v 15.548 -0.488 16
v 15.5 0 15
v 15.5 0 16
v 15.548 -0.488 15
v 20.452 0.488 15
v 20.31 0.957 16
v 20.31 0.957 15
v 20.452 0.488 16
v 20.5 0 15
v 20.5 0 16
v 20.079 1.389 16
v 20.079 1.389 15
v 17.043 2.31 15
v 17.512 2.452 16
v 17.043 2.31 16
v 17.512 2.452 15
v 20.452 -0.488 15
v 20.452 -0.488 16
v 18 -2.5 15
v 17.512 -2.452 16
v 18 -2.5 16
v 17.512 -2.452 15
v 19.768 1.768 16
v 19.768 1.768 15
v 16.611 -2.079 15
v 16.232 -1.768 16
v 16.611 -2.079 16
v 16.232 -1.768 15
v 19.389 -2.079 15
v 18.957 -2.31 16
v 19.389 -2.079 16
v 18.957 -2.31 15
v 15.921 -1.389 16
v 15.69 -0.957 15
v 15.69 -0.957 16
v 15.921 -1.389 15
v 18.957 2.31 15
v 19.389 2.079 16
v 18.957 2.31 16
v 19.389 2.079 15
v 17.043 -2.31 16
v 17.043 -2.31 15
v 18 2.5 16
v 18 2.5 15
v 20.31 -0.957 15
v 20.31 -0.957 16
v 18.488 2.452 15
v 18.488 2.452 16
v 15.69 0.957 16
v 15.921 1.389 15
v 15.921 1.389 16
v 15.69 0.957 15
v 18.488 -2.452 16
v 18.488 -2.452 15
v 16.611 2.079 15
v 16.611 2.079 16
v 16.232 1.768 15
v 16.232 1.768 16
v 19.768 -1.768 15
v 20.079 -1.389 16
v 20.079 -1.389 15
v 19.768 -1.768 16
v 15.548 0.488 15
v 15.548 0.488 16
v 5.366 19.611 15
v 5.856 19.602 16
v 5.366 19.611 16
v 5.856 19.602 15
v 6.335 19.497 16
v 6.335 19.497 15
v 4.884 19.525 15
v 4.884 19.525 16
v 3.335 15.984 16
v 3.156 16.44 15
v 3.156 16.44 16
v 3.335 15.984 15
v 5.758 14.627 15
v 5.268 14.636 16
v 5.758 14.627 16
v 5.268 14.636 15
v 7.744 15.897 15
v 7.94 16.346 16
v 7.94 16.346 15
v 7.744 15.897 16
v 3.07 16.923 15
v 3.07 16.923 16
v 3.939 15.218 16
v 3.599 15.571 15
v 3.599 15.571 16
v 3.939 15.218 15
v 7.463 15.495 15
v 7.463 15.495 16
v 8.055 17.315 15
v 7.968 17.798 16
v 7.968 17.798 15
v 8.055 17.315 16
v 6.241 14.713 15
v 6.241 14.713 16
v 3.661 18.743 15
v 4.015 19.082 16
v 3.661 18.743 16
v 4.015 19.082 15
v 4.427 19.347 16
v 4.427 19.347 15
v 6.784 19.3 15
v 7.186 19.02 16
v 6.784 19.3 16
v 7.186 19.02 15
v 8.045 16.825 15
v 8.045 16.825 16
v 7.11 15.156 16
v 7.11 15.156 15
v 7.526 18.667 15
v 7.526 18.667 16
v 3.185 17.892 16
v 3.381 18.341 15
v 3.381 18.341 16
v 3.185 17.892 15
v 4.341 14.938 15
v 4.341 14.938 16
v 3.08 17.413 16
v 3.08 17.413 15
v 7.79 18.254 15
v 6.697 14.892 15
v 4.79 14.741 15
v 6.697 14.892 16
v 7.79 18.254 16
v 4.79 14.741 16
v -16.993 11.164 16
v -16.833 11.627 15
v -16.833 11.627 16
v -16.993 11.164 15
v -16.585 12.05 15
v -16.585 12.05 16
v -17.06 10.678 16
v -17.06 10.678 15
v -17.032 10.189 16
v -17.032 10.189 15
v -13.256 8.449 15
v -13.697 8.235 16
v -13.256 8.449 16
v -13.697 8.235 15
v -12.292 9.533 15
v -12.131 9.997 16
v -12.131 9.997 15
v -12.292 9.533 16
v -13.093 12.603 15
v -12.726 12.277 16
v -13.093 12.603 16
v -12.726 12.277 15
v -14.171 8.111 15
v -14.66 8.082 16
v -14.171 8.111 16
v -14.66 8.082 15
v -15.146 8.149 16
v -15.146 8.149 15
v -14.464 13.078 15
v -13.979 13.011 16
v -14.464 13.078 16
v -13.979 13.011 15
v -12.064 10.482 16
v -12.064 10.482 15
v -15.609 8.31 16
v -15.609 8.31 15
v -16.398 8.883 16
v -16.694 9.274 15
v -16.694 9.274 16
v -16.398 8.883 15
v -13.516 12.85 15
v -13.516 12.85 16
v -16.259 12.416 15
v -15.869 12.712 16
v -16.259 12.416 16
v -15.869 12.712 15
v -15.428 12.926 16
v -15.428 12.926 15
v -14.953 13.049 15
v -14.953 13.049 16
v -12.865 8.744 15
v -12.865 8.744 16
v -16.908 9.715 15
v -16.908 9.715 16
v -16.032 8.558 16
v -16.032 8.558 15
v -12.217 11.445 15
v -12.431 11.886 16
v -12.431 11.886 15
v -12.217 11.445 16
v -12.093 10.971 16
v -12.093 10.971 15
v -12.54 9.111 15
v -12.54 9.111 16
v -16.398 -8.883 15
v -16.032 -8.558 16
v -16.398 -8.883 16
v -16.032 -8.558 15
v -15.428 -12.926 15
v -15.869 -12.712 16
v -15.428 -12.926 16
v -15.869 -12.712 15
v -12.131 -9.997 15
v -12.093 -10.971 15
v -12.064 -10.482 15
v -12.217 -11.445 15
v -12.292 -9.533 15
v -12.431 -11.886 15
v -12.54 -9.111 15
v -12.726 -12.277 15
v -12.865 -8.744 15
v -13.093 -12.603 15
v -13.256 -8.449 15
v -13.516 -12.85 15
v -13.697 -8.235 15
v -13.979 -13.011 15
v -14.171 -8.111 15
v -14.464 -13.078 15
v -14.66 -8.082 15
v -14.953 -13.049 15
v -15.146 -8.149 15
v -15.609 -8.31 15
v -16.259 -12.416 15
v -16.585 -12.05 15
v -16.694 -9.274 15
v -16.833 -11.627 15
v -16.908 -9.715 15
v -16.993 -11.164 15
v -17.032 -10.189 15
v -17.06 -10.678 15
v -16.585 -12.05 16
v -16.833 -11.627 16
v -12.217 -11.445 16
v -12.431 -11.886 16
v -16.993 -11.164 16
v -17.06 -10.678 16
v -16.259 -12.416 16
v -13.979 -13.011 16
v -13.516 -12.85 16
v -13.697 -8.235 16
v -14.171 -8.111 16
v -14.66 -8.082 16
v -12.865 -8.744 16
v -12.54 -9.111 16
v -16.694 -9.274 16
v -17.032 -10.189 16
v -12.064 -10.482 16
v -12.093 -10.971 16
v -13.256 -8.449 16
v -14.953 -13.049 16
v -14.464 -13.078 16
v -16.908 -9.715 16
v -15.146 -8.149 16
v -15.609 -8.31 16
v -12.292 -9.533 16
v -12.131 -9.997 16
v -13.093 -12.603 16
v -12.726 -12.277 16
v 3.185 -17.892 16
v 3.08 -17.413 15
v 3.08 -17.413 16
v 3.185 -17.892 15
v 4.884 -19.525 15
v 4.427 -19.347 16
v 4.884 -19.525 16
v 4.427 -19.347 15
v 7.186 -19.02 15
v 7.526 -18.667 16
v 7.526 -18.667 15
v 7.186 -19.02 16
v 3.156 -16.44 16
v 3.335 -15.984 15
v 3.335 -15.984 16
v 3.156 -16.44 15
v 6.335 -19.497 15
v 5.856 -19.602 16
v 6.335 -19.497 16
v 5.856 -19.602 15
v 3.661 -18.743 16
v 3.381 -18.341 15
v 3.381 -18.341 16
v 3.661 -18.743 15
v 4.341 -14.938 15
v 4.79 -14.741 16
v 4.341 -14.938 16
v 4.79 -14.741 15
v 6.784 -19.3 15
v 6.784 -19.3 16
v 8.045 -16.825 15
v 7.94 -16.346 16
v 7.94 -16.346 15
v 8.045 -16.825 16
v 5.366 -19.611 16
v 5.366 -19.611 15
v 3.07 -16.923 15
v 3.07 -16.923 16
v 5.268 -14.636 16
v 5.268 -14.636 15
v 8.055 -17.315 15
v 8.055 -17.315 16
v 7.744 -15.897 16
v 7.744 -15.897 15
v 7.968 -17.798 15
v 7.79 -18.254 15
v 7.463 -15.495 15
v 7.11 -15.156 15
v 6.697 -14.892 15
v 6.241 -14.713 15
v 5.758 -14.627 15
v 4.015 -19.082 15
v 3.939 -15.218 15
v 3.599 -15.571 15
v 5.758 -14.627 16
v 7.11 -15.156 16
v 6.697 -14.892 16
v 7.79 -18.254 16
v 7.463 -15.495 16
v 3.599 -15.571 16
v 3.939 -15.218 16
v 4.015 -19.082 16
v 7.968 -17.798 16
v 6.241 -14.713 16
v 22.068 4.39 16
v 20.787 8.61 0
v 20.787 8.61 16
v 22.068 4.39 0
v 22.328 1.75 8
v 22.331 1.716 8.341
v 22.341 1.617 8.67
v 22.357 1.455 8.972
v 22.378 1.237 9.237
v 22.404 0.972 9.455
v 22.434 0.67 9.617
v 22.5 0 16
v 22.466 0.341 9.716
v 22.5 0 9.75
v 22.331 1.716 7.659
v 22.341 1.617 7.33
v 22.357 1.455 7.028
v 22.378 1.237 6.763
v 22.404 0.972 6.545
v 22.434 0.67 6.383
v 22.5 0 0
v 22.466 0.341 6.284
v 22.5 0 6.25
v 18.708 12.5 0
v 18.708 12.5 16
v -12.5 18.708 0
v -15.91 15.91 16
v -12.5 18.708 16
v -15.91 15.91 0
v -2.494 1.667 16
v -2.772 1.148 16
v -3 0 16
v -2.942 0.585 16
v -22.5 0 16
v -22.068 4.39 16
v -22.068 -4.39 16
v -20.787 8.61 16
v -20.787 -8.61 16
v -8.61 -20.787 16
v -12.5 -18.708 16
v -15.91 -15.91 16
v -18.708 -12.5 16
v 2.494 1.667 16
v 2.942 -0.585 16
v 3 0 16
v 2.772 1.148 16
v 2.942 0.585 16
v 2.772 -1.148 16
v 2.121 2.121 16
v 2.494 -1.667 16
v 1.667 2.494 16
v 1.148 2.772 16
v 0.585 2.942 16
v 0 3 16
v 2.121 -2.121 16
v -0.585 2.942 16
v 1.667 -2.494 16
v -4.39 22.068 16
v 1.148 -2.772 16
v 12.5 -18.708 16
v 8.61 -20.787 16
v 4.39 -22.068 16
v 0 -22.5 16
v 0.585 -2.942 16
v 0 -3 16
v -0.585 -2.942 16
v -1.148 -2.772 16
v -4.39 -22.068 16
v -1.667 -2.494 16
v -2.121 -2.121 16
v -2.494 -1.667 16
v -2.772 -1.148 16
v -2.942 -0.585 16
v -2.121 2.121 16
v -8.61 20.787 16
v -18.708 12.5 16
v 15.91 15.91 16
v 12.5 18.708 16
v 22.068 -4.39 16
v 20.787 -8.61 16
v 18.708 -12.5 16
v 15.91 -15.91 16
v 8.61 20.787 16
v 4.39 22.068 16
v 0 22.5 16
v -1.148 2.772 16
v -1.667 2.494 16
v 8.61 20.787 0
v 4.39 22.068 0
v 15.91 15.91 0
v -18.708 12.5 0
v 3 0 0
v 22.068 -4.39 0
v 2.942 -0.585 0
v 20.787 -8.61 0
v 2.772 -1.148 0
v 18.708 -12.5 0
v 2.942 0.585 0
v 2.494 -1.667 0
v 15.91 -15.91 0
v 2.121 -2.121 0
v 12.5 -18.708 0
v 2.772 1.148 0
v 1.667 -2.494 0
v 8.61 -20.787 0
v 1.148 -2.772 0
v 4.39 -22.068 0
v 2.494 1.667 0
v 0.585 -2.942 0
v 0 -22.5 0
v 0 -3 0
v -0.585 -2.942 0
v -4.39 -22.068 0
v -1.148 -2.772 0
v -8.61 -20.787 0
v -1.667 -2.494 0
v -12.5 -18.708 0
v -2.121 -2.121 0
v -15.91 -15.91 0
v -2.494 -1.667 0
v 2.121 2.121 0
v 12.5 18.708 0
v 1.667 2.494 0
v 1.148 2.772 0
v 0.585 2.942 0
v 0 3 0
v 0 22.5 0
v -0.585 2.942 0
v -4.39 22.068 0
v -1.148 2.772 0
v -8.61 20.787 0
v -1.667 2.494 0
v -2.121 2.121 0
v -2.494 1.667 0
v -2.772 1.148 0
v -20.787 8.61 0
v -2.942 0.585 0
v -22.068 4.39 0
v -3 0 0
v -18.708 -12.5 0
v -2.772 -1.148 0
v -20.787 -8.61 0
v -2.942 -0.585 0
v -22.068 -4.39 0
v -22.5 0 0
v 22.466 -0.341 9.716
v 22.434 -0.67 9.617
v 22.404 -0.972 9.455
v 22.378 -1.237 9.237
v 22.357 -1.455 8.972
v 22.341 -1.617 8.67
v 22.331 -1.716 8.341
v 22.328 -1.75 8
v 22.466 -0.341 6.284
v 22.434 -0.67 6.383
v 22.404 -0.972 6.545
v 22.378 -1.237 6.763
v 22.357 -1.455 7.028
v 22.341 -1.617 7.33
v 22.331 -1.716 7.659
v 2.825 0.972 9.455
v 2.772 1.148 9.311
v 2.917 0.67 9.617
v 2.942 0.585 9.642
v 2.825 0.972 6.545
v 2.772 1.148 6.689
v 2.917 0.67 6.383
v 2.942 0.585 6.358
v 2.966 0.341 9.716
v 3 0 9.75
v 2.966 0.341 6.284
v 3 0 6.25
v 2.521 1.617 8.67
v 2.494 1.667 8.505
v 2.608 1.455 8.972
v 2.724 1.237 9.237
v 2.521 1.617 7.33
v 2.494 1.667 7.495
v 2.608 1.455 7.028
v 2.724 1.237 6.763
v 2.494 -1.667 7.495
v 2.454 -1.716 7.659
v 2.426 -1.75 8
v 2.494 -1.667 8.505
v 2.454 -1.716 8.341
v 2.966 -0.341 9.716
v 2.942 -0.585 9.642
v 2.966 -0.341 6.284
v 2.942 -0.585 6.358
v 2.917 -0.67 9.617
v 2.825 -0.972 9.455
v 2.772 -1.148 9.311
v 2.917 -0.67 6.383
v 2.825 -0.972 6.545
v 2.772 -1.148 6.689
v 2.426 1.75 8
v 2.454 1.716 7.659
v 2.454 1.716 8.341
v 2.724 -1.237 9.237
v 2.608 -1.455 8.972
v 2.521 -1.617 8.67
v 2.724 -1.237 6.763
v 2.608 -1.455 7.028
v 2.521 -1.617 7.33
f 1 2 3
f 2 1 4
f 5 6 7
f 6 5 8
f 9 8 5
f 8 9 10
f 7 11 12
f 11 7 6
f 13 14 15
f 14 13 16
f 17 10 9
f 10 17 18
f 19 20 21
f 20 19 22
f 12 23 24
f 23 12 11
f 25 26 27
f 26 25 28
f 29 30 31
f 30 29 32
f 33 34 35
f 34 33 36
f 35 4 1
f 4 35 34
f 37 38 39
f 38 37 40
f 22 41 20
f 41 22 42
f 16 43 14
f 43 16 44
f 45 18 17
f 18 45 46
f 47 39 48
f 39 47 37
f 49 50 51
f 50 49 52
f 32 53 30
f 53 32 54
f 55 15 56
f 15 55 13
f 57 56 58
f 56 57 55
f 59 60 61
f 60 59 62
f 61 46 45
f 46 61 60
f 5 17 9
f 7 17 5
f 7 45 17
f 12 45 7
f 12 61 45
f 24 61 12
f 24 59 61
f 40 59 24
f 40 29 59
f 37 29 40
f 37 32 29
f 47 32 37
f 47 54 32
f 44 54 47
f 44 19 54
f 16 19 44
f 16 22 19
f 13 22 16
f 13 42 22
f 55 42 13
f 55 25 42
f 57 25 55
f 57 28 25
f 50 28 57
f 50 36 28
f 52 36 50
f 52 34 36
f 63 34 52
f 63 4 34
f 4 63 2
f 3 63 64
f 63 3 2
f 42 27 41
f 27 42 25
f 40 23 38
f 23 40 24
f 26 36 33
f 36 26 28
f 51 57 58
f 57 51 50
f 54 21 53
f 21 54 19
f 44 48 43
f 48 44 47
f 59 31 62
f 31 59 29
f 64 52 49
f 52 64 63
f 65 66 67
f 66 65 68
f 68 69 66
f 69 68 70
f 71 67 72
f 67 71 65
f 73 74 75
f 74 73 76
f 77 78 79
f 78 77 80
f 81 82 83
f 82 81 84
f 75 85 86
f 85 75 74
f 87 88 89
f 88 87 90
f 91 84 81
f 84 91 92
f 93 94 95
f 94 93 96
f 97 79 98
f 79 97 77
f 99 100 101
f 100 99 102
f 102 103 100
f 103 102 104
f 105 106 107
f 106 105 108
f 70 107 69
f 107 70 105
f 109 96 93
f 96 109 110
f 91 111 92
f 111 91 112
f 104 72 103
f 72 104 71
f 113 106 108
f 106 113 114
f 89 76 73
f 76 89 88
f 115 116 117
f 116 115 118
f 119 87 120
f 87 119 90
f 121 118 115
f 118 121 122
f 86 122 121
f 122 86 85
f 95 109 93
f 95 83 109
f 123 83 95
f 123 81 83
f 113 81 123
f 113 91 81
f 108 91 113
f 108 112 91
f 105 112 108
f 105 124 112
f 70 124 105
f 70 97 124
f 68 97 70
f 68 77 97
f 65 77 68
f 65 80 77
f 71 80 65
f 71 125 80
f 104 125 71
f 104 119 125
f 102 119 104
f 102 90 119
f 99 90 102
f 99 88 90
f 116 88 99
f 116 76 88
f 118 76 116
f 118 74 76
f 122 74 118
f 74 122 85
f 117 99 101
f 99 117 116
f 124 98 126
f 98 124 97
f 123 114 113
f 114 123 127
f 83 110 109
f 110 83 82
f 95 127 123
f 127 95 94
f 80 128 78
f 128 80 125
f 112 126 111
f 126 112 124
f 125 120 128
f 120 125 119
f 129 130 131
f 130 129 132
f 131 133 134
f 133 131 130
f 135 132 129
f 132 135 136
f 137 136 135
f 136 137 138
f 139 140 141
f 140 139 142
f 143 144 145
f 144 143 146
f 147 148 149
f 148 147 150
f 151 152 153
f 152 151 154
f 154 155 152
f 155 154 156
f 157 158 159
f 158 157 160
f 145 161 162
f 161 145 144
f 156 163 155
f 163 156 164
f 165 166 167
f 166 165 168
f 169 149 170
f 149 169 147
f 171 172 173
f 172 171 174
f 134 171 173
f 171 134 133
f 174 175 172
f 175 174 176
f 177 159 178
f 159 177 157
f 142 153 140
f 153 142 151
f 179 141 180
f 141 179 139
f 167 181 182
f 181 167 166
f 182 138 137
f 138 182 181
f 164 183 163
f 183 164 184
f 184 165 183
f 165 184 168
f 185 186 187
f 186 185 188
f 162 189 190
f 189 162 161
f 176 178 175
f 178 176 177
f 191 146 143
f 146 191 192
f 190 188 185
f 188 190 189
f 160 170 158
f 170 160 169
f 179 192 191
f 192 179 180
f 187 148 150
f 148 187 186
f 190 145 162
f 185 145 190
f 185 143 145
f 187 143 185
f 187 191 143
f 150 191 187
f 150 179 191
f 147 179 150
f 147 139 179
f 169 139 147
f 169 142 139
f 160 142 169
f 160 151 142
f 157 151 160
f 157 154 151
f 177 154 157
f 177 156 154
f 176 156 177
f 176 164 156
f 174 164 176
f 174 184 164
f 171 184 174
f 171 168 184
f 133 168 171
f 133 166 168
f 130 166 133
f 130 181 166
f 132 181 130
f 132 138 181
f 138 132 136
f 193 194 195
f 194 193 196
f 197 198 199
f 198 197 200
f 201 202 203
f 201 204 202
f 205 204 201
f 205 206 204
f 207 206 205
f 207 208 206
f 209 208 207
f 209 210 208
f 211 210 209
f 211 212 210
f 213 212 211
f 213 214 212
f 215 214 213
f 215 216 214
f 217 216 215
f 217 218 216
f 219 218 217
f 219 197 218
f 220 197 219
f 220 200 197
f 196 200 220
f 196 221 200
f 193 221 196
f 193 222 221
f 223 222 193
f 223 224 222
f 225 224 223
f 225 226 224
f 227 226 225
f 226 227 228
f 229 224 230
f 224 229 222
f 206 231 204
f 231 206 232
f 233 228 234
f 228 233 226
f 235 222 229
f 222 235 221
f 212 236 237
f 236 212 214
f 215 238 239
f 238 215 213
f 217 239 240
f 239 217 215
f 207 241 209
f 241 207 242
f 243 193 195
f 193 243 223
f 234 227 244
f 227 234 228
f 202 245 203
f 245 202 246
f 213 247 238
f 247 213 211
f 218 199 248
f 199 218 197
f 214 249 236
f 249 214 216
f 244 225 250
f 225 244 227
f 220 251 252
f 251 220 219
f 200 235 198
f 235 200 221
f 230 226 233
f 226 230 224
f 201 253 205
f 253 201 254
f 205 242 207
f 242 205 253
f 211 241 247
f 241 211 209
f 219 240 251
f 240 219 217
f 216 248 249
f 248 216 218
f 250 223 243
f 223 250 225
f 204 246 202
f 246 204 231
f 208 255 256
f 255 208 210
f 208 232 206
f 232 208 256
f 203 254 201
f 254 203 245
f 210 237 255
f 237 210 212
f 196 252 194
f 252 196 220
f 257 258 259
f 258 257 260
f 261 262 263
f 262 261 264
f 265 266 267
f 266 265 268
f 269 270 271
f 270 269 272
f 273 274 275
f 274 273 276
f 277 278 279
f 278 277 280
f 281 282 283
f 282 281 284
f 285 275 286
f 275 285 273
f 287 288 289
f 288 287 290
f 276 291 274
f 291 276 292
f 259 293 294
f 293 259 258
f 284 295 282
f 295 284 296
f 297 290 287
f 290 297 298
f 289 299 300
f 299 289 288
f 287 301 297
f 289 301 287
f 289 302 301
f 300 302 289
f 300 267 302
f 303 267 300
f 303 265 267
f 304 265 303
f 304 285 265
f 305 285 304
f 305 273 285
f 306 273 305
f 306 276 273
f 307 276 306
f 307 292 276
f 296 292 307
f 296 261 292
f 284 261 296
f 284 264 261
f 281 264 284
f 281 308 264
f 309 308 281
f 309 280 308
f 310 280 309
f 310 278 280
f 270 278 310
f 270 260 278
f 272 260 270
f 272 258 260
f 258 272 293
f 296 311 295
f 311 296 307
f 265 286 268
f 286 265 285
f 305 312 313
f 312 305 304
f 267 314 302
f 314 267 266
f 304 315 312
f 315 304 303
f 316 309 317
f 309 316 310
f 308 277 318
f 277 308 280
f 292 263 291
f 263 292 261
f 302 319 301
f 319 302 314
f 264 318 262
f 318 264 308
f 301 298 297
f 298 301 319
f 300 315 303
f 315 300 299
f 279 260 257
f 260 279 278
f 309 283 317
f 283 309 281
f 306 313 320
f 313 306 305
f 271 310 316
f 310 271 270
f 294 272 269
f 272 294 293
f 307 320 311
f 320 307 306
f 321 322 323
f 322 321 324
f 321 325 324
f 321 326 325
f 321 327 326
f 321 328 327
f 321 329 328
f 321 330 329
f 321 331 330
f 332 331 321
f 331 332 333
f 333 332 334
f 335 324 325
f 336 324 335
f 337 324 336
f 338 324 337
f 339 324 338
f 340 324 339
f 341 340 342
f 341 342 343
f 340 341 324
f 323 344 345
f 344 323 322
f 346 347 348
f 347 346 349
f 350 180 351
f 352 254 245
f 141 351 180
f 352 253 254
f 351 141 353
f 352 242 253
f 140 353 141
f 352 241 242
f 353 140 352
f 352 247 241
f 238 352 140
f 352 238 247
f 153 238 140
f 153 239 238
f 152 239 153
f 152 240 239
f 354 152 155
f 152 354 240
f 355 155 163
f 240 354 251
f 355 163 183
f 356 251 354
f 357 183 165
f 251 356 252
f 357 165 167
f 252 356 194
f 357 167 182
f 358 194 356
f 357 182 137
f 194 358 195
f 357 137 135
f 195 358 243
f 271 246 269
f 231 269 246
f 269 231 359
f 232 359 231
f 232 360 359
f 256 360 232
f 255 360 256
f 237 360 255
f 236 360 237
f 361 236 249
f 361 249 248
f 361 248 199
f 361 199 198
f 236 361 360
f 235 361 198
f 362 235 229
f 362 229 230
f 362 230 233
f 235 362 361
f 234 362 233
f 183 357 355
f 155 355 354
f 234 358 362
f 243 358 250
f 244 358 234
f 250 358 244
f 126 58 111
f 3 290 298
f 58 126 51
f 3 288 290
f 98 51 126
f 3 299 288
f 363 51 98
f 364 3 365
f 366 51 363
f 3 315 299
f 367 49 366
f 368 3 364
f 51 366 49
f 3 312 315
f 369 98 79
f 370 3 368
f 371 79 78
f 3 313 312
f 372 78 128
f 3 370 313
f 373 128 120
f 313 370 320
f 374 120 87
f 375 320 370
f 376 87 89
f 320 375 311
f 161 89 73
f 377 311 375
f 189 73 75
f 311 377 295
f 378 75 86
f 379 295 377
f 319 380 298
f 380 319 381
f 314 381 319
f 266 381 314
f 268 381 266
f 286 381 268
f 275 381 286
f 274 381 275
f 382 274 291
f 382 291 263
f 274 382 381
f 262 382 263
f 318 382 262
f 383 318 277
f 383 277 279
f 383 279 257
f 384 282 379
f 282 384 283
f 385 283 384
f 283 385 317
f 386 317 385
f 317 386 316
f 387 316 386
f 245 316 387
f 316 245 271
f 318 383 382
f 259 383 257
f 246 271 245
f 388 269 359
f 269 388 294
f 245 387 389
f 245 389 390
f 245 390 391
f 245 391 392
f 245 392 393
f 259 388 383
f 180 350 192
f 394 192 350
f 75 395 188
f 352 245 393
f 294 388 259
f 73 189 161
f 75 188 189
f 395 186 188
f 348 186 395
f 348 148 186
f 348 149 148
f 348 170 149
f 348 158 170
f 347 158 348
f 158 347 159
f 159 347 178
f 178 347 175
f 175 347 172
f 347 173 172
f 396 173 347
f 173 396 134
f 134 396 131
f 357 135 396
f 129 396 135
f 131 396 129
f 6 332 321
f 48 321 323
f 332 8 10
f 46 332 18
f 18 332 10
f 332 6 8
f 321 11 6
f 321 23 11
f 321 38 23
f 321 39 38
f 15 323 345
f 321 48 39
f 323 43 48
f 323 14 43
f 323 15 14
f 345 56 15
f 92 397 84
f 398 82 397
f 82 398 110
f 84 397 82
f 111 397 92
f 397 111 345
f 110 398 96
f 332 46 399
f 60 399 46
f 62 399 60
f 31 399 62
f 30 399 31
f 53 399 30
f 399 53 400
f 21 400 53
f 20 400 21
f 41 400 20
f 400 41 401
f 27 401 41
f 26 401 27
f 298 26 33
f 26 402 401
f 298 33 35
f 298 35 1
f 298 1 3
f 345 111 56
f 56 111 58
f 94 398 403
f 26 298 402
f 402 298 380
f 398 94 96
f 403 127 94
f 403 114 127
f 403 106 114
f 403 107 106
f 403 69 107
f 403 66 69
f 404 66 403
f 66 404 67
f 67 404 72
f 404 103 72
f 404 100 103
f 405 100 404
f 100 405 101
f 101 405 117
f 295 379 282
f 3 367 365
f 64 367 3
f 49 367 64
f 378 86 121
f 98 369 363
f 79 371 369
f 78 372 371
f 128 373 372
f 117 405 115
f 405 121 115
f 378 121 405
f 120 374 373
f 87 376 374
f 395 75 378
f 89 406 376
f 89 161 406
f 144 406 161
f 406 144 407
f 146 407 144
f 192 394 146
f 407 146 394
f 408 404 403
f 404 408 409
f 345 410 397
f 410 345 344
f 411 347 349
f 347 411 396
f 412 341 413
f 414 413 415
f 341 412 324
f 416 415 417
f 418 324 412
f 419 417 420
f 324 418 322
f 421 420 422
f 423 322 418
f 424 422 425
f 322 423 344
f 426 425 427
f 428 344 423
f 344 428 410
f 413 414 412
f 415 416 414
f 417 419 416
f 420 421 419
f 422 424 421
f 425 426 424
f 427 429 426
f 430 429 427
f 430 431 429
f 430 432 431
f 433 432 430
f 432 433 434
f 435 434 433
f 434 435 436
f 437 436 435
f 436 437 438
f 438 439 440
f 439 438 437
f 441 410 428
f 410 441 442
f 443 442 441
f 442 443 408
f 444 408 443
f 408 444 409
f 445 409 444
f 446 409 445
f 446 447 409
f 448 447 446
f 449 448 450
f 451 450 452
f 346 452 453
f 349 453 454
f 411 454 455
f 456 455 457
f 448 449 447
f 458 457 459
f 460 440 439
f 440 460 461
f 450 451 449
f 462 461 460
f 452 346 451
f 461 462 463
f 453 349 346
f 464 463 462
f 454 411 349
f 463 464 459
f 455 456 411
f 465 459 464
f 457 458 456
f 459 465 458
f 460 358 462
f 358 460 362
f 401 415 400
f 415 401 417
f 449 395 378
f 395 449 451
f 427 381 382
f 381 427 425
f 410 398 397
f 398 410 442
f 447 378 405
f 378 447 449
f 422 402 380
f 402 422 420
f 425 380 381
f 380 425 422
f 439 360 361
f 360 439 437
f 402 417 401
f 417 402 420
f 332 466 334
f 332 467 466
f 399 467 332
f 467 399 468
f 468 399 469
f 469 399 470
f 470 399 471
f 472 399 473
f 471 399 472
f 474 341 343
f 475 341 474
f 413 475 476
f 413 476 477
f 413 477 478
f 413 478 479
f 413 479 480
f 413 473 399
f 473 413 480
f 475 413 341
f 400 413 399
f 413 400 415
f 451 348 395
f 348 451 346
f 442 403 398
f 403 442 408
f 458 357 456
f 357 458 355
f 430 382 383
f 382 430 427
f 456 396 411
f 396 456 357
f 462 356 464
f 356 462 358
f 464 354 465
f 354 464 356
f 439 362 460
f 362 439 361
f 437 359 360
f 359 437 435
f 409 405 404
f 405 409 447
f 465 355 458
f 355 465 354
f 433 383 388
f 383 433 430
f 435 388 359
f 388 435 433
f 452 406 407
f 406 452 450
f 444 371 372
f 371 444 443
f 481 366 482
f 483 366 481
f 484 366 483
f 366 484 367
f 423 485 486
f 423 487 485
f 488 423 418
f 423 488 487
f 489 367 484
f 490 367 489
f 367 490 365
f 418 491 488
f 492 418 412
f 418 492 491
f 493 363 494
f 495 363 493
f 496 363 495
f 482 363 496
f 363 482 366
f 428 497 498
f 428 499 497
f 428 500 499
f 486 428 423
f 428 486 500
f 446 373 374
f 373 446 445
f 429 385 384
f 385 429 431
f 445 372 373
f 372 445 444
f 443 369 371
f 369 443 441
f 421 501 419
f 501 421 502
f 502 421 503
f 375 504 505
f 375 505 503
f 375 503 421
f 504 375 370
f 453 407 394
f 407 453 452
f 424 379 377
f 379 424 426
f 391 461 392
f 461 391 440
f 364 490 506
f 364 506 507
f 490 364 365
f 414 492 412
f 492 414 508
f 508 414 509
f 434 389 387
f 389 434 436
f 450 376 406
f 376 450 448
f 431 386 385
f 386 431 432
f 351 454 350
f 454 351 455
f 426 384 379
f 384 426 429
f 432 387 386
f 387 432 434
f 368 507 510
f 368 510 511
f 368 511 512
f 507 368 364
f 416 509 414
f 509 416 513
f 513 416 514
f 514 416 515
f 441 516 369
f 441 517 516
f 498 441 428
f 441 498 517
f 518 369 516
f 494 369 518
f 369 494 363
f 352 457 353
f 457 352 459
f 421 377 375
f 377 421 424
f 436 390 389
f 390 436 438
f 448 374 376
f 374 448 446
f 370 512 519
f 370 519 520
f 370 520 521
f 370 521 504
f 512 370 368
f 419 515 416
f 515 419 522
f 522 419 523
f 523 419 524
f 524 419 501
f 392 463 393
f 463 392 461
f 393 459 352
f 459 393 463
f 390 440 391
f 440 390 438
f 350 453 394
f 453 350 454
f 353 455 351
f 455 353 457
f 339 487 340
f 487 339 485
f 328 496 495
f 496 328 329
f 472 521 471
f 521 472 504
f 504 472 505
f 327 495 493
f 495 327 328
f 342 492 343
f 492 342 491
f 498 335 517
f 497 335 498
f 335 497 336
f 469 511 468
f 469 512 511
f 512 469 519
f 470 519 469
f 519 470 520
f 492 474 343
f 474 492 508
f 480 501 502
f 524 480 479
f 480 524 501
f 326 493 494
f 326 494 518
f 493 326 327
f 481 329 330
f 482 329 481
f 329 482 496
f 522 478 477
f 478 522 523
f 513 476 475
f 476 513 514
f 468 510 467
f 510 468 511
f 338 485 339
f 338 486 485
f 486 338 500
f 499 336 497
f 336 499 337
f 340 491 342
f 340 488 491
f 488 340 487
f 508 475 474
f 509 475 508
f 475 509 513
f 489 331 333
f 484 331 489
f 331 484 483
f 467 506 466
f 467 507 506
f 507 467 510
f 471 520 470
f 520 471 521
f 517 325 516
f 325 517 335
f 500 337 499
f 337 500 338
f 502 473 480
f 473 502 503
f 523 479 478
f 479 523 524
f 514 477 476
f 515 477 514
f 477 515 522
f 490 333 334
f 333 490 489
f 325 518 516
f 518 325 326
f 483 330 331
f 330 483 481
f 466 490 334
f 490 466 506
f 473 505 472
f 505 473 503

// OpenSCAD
$fn = 32;

// ----------------------------------------------------------------------
// Control knob: dimpled knob
// ----------------------------------------------------------------------

// --- parameters (mm) ---
dimp_d = 5;               // finger dimple diameter
n_dimp = 5;               // number of dimples
dimp_r = 18;              // dimple ring radius
knob_d = 45;              // knob body diameter
knob_h = 16;              // knob body height
bore_d = 6;               // shaft bore diameter
set_d = 3.5;              // set screw bore diameter
fit_tol = 0.1;            // tolerance for press fits, mm
free_tol = 0.5;           // tolerance for clearance fits, mm

dimp_step = 360 / n_dimp;  // dimple angular step

difference() {
  cylinder(h = knob_h, d = knob_d);
  translate([0, 0, -1]) cylinder(h = knob_h + 2, d = bore_d);
  translate([-1, 0, knob_h / 2]) rotate([0, 90, 0])
    cylinder(h = knob_d / 2 + bore_d / 2 + 2, d = set_d);  for (i = [0 : n_dimp - 1])
    rotate([0, 0, i * dimp_step])
      translate([dimp_r, 0, knob_h - 1])
        cylinder(h = 2, d = dimp_d);
}
